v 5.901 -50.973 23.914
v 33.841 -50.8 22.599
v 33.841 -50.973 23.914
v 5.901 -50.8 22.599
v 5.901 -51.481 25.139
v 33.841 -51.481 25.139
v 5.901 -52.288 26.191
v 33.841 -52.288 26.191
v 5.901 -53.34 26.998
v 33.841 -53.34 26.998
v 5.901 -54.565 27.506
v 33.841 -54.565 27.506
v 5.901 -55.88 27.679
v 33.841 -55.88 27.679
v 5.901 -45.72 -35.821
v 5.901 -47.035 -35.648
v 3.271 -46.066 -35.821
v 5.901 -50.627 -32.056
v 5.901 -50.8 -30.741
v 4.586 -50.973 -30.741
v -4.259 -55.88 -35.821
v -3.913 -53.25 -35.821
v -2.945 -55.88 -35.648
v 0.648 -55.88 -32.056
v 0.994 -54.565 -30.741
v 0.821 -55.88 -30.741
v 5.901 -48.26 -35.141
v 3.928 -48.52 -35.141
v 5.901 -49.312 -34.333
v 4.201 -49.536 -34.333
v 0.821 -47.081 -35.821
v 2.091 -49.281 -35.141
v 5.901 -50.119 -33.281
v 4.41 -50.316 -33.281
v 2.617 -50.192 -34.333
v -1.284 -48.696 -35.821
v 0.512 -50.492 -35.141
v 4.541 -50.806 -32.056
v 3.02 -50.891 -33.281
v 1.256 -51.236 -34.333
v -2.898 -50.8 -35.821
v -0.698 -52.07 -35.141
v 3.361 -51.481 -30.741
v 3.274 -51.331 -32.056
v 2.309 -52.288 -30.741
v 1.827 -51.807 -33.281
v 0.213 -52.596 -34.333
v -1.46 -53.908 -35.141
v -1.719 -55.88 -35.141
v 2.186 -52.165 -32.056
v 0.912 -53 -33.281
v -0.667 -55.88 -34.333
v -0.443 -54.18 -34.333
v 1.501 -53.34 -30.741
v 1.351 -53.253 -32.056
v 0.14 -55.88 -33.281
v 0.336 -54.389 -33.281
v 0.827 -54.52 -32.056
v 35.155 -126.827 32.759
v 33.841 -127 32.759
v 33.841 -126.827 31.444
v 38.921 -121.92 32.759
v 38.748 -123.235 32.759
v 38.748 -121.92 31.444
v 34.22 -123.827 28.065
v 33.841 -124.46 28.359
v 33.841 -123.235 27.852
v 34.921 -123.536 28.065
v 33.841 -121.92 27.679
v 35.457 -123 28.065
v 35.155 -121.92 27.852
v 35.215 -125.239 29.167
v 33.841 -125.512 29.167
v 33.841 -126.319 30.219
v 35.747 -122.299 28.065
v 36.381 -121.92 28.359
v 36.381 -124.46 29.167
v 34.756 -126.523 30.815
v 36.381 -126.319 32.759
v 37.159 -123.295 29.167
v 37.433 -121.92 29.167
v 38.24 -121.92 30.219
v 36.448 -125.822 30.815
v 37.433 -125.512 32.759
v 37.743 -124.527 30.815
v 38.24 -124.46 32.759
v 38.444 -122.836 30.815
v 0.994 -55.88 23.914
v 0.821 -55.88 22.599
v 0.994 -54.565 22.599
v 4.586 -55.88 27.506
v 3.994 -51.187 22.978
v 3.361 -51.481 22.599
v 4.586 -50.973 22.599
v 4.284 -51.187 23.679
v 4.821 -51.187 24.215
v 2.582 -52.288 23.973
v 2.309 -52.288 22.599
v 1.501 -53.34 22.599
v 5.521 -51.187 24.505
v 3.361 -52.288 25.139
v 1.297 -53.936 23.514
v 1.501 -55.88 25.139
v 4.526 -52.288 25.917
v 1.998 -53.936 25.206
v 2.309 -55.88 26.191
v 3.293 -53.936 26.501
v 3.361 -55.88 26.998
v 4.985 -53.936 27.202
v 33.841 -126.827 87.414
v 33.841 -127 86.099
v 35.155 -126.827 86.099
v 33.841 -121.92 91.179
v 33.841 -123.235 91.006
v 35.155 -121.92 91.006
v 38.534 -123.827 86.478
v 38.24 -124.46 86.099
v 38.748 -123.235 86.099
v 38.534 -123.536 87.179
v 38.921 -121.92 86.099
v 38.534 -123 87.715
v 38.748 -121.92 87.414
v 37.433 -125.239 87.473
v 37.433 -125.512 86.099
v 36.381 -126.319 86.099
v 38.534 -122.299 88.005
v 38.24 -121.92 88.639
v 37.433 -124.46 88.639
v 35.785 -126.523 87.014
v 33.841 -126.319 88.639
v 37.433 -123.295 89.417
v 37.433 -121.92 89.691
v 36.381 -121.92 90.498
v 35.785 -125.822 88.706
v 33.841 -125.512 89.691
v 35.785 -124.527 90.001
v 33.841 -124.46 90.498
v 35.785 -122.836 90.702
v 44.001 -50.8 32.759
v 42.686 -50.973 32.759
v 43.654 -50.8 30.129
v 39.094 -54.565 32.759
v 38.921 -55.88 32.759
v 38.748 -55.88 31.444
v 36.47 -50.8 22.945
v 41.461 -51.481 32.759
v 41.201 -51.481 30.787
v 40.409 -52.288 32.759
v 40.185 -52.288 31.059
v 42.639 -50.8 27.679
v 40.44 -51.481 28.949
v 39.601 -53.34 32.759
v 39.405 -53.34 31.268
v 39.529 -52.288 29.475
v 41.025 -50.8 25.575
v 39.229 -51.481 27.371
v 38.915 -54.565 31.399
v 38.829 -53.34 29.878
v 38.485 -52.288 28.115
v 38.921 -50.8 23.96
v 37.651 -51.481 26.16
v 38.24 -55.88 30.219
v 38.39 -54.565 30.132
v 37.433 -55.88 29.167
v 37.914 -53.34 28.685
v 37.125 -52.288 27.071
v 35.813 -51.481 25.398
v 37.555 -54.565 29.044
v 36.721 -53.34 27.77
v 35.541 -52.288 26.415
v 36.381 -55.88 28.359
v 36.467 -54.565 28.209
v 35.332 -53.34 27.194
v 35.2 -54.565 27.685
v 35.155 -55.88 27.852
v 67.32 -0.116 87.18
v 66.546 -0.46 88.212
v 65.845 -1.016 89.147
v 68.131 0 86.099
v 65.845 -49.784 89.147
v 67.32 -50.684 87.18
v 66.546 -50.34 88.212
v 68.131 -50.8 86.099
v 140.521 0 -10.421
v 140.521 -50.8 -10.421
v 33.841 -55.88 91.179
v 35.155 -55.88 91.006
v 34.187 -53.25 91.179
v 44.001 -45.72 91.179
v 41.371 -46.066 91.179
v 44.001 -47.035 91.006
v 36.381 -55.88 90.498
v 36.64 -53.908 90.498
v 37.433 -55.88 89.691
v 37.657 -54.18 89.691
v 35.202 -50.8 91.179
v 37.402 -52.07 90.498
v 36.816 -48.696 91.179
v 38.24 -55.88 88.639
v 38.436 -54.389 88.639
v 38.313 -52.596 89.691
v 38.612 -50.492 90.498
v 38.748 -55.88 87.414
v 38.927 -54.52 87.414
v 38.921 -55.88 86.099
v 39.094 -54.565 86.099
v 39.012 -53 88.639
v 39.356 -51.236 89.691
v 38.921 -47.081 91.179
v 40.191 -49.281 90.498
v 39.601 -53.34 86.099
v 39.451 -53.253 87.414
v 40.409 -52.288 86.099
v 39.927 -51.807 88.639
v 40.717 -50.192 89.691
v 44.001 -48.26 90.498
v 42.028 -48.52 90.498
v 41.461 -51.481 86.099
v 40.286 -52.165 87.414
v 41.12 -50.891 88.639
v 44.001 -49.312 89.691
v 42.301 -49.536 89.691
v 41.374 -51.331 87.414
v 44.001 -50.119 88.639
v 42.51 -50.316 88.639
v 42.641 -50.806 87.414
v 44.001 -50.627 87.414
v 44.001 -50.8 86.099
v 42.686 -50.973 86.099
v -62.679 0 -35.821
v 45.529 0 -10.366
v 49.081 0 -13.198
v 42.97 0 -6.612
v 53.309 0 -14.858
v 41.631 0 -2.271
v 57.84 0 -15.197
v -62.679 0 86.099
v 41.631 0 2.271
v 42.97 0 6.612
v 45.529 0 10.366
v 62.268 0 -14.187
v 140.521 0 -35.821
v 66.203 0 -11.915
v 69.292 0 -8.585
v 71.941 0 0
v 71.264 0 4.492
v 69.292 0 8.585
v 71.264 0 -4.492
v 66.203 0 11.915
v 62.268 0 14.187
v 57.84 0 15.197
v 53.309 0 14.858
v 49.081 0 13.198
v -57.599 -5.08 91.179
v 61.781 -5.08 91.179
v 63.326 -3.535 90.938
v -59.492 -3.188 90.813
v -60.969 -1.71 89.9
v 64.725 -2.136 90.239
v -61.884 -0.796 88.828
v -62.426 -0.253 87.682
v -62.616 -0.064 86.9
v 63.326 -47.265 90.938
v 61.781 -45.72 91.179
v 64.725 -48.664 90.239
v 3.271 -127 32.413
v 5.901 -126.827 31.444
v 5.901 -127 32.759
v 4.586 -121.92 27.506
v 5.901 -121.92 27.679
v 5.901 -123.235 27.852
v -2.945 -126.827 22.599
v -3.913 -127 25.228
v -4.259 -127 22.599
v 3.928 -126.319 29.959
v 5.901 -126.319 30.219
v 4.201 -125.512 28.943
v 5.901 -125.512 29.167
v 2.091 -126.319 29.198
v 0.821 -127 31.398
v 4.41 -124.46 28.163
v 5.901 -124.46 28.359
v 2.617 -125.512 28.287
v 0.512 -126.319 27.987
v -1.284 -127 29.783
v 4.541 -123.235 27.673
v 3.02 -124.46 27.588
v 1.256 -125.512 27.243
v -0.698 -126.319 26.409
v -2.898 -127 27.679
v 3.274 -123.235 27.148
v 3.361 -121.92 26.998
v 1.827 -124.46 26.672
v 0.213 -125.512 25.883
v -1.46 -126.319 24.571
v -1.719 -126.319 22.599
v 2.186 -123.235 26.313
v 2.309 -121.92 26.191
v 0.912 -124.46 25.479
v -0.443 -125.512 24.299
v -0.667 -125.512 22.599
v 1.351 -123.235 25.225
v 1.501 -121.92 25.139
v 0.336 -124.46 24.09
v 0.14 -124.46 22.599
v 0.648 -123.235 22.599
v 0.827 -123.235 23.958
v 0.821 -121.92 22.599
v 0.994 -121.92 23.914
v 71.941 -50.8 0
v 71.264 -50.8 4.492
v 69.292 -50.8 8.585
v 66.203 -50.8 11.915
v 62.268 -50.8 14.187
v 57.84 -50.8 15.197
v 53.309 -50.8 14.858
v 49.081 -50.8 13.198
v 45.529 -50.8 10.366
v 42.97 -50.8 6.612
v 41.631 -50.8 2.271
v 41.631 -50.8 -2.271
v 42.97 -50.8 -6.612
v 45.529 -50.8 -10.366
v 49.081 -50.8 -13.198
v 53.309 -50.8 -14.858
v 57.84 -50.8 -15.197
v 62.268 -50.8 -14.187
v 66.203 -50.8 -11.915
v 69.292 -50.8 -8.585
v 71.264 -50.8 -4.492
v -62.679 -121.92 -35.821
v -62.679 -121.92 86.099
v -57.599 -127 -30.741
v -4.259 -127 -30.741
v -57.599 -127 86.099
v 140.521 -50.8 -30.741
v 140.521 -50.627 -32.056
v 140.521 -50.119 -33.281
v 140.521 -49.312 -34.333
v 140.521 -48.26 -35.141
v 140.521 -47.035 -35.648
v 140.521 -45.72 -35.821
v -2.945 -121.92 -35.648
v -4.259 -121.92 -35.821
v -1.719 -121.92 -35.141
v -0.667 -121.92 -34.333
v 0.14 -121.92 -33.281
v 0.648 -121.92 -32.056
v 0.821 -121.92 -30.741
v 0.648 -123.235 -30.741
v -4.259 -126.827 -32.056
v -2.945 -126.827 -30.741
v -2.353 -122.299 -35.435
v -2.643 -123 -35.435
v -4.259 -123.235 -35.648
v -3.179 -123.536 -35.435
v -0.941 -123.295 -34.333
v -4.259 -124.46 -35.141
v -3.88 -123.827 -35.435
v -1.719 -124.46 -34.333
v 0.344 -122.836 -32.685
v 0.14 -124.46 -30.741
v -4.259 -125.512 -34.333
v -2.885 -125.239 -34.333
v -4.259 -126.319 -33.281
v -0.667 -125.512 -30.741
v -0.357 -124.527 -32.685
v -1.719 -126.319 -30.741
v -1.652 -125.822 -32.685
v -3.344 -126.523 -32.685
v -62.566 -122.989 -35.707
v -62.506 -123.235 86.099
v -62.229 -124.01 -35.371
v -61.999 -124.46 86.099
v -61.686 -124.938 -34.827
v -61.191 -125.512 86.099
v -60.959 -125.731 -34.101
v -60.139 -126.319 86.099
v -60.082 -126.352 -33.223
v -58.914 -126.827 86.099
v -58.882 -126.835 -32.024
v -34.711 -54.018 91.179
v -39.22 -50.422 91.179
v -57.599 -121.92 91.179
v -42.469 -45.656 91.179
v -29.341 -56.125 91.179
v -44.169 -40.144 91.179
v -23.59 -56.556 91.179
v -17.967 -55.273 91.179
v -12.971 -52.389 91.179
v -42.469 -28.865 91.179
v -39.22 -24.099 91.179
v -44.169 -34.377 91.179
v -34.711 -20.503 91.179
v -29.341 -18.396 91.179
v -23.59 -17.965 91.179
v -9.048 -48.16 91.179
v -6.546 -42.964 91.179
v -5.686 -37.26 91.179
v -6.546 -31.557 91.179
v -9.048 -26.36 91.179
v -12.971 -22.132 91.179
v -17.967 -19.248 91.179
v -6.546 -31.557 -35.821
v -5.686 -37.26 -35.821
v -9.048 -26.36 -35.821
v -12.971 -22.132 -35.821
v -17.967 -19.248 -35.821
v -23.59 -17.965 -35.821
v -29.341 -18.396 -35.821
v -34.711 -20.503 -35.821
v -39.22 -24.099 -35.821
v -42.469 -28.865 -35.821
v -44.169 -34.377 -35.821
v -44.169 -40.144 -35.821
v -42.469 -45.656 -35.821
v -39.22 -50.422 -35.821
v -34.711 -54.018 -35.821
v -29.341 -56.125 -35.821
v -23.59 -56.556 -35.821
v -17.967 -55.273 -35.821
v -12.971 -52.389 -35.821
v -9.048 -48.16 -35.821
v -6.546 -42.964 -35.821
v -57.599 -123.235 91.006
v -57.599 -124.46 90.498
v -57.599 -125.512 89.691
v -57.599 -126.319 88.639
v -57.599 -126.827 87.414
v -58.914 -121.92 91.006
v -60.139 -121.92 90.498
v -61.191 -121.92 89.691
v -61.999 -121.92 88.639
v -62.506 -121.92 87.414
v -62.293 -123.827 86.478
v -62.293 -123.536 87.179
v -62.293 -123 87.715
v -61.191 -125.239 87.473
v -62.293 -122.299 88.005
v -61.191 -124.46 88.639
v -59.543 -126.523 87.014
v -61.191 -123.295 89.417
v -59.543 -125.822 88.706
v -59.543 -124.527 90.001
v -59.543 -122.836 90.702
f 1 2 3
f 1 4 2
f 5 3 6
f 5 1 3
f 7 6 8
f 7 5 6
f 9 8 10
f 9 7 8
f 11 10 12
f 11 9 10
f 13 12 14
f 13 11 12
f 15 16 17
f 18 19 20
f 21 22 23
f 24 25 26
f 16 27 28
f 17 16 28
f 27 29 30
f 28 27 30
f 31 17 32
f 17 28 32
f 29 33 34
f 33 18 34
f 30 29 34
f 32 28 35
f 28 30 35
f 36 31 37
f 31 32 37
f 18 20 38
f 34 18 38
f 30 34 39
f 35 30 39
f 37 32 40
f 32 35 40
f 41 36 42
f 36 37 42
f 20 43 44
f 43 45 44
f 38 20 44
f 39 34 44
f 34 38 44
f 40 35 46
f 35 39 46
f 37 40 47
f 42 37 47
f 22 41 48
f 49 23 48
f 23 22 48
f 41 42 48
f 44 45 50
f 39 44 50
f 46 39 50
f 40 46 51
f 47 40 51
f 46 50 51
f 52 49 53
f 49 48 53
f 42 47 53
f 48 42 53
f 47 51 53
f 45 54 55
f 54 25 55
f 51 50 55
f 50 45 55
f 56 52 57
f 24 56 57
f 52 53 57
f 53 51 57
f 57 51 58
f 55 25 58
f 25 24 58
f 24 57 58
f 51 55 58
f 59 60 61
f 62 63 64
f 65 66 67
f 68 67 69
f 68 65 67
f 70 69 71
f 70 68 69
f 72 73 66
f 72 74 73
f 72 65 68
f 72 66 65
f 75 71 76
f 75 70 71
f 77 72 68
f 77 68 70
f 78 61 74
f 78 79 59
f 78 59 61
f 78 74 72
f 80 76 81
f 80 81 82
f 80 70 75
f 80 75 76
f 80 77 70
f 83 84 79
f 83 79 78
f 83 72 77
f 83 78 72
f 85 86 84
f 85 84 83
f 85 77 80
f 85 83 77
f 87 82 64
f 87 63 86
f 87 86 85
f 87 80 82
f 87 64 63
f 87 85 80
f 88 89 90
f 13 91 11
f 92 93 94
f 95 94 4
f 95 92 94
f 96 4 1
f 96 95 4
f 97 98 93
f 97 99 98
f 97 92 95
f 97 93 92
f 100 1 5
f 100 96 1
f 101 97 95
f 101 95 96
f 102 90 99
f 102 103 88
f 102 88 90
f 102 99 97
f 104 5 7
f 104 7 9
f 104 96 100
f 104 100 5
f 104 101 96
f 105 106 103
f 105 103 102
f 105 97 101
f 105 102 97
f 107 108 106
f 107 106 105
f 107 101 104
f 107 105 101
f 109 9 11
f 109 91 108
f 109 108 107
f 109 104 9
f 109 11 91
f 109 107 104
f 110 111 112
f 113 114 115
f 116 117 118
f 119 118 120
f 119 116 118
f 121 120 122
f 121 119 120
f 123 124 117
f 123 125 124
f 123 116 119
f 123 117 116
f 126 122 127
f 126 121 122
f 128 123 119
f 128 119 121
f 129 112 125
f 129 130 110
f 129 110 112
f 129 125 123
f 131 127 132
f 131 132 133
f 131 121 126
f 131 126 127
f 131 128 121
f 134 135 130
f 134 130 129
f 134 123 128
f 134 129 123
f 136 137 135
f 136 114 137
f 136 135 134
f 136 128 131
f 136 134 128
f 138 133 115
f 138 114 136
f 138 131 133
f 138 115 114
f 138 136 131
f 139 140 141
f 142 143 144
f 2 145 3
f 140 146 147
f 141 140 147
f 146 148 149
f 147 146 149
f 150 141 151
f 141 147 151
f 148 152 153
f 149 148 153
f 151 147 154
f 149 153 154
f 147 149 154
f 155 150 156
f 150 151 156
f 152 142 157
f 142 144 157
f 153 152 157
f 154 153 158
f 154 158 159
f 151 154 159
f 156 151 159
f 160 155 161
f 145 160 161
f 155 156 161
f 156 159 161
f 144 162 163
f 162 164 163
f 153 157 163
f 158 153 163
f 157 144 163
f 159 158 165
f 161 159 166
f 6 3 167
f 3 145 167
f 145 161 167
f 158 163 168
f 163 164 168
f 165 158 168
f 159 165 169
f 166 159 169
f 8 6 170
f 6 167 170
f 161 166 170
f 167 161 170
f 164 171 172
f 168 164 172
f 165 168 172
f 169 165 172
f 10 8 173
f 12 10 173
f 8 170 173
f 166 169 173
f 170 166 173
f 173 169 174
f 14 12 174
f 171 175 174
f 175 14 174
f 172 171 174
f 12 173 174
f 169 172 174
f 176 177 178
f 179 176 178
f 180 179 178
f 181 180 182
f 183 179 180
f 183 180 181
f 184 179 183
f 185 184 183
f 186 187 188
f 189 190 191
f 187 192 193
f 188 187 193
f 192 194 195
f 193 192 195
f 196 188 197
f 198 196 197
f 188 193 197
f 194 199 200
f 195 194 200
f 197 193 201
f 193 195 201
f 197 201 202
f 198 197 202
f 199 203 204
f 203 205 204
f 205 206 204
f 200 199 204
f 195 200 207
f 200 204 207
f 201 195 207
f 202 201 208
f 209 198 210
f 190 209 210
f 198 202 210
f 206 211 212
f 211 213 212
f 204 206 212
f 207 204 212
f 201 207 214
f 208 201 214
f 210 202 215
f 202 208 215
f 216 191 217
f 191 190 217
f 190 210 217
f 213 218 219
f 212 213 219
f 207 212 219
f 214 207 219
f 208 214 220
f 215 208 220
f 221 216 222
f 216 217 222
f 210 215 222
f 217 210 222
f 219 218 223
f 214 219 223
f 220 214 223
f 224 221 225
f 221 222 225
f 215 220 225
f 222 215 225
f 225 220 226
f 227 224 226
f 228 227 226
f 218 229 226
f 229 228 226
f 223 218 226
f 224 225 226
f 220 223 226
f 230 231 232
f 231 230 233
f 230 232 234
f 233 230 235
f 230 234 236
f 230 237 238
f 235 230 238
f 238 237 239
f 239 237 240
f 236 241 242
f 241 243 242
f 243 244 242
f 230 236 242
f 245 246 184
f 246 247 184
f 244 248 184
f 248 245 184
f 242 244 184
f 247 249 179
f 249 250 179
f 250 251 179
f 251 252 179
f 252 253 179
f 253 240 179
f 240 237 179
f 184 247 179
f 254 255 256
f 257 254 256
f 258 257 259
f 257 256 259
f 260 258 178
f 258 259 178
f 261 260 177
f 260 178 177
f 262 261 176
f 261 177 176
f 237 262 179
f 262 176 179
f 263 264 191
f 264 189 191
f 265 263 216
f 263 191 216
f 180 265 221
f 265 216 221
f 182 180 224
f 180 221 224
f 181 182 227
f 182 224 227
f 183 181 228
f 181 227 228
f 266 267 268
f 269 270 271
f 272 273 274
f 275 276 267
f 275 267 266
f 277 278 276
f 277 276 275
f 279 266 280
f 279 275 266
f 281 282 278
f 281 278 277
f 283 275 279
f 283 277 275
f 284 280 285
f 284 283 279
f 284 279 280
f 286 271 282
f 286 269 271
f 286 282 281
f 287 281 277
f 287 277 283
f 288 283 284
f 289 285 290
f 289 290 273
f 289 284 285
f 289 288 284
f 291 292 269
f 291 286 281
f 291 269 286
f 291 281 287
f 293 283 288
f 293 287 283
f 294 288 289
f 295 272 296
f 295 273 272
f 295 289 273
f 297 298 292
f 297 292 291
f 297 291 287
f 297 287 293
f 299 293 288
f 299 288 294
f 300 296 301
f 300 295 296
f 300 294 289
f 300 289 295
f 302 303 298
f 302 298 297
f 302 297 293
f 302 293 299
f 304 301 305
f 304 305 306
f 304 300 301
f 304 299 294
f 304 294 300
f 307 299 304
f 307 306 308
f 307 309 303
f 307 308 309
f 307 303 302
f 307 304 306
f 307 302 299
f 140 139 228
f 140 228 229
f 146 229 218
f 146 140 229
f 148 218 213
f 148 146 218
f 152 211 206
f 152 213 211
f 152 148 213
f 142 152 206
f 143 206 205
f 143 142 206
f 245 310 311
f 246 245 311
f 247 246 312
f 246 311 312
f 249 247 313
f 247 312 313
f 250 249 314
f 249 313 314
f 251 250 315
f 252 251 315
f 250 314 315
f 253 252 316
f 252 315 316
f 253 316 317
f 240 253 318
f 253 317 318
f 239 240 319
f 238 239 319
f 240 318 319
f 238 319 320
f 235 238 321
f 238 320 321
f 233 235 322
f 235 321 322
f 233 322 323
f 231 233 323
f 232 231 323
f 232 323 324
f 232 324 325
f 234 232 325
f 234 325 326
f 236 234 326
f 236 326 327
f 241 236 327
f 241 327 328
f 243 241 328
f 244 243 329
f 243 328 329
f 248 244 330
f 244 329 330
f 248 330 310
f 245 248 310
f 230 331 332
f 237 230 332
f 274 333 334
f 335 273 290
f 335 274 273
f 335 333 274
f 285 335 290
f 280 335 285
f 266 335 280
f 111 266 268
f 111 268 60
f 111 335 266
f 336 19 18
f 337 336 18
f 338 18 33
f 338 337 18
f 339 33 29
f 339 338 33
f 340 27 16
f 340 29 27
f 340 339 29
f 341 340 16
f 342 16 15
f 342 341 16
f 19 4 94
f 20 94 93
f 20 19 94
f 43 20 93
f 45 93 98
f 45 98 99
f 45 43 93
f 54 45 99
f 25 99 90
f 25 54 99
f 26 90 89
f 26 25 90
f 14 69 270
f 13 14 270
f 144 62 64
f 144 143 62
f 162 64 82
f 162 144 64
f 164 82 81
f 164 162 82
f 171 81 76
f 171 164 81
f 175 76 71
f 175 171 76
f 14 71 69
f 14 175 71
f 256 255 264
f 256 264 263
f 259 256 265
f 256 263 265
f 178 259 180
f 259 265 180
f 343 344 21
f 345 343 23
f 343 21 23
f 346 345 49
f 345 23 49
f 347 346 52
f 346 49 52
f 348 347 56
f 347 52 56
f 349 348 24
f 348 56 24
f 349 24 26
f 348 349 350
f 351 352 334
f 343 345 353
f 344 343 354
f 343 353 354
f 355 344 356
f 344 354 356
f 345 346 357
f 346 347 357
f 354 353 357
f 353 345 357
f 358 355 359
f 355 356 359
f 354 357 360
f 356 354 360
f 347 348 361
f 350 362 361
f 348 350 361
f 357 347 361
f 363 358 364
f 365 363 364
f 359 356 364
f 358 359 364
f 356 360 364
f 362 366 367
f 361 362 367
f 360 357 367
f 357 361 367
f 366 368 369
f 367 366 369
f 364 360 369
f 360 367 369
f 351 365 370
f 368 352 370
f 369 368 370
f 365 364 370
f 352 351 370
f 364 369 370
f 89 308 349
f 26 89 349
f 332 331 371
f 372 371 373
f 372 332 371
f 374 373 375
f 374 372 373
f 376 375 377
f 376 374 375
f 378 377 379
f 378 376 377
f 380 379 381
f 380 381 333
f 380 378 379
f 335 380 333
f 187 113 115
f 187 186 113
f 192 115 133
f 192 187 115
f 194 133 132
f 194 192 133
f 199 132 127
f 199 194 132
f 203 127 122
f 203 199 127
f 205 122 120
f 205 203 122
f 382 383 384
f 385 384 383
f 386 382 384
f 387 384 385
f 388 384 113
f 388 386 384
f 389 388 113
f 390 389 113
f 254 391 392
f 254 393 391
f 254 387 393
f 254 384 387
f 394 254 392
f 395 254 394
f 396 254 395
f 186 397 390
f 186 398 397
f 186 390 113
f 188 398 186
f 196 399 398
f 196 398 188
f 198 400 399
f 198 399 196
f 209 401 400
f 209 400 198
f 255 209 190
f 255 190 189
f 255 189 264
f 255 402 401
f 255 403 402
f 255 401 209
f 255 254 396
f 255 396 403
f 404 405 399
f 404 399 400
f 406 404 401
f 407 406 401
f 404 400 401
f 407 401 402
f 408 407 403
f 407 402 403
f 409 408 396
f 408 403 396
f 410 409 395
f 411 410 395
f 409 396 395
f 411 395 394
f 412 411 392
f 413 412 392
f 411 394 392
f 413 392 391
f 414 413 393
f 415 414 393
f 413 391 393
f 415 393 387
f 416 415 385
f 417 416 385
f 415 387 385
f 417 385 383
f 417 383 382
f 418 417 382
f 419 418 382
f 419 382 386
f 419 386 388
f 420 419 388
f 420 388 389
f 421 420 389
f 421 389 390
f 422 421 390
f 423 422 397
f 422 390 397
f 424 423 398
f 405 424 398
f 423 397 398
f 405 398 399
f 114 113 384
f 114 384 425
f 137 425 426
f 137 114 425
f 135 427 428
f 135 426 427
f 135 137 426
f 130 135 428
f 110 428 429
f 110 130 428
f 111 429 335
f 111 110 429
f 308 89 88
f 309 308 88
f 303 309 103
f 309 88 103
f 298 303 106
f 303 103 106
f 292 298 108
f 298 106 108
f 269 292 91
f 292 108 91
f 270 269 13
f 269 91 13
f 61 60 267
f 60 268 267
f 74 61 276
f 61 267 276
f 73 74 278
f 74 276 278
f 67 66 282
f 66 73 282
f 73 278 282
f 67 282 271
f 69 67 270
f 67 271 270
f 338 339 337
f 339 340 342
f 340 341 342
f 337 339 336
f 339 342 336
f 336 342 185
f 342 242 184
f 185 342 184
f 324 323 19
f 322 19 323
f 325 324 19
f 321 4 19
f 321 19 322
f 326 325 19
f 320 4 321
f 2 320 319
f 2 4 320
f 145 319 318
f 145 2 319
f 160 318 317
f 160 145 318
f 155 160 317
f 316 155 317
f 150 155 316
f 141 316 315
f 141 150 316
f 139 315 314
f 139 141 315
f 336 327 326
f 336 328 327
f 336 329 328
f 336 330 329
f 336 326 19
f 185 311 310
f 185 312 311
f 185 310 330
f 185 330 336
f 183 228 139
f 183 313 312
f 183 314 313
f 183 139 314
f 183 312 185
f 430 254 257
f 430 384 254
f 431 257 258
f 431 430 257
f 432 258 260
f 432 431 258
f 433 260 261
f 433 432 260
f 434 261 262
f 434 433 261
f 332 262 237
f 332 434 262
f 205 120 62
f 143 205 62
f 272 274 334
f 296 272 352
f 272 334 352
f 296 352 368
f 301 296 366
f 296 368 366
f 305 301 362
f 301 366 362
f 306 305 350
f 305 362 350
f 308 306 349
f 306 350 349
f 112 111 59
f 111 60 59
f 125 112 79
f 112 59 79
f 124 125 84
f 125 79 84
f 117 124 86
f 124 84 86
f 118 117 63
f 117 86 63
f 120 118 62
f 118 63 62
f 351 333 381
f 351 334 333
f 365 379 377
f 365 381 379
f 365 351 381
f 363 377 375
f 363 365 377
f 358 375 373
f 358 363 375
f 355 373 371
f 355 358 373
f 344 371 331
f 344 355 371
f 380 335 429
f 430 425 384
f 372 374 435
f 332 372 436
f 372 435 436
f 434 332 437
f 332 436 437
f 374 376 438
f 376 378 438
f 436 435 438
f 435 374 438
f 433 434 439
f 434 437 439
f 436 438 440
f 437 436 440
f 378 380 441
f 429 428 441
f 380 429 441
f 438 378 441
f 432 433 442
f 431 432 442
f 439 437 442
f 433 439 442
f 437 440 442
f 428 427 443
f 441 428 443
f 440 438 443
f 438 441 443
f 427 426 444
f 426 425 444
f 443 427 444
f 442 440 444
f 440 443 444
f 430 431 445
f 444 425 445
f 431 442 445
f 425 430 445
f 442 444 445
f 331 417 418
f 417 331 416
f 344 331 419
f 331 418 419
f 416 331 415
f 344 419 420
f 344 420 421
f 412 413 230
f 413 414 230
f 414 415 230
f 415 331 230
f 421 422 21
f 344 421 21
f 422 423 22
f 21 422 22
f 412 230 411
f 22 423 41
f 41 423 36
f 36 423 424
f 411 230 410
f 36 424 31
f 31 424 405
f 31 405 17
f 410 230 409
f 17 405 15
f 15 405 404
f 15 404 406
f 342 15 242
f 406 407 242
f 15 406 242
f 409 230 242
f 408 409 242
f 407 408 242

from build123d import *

# Parameters (mm, degrees)
F0_W     = 203.2
F0_H     = 127
F1_DEPTH = 127
F3_DEPTH = 76.2
F4_SIZE2 = 101.6
F4_SIZE  = 76.2
F5_R     = 5.08
F6_R     = 15.24
F7_DEPTH = 50.8
F8_R     = 19.349676851
F9_DEPTH = 127


with BuildPart() as f1:
    # F0 (on Front) → F1 (new body)
    with BuildSketch(Plane.XZ):
        with Locations((38.9206162602, 27.6787289854)):
            Rectangle(F0_W, F0_H)
    extrude(amount=F1_DEPTH)

    # F2 (on face) → F3 (cut)
    with BuildSketch(Plane.XZ.offset(127)):
        Polygon((38.9206162602, 27.6787289854), (0.8206162602, 27.6787289854), (0.8206162602, -35.8212710146), (140.5206162602, -35.8212710146), (140.5206162602, 91.1787289854), (38.9206162602, 91.1787289854), align=None)
    extrude(amount=-F3_DEPTH, mode=Mode.SUBTRACT)

    # F4
    f4_edges = [f1.edges().sort_by_distance(p)[0] for p in [
        (140.520616, -25.4, 91.178729),
    ]]
    f4_side = f1.faces().sort_by_distance((17.149188, -52.614286, 91.178729))[0]
    chamfer(f4_edges, length=F4_SIZE, length2=F4_SIZE2, reference=f4_side)

    # F5
    f5_edges = [f1.edges().sort_by_distance(p)[0] for p in [
        (-11.879384, -127, 91.178729),
        (38.920616, -127, 59.428729),
        (19.870616, -127, 27.678729),
        (0.820616, -127, -4.071271),
        (38.920616, -88.9, 27.678729),
        (-62.679384, -127, 27.678729),
        (0.820616, -88.9, 27.678729),
        (0.820616, -88.9, -35.821271),
        (0.820616, -50.8, -4.071271),
        (38.920616, -50.8, 59.428729),
        (38.920616, -88.9, 91.178729),
        (0.820616, 0, 91.178729),
        (64.320616, -25.4, 91.178729),
        (-62.679384, -63.5, 91.178729),
        (51.620616, -50.8, 91.178729),
        (-30.929384, -127, -35.821271),
        (70.670616, -50.8, -35.821271),
        (19.870616, -50.8, 27.678729),
    ]]
    fillet(f5_edges, radius=F5_R)

    # F6 (on face) → F7 (cut, through all)
    with BuildSketch(Plane.XZ.offset(50.8)):
        with Locations((56.7006162602, 0)):
            Circle(F6_R)
    extrude(amount=-F7_DEPTH, mode=Mode.SUBTRACT)

    # F8 (on face) → F9 (cut, through all)
    with BuildSketch(Plane.XY.offset(91.1787289854)):
        with Locations((-25.0357538462, -37.260428071)):
            Circle(F8_R)
    extrude(amount=-F9_DEPTH, mode=Mode.SUBTRACT)


solid = f1.part
